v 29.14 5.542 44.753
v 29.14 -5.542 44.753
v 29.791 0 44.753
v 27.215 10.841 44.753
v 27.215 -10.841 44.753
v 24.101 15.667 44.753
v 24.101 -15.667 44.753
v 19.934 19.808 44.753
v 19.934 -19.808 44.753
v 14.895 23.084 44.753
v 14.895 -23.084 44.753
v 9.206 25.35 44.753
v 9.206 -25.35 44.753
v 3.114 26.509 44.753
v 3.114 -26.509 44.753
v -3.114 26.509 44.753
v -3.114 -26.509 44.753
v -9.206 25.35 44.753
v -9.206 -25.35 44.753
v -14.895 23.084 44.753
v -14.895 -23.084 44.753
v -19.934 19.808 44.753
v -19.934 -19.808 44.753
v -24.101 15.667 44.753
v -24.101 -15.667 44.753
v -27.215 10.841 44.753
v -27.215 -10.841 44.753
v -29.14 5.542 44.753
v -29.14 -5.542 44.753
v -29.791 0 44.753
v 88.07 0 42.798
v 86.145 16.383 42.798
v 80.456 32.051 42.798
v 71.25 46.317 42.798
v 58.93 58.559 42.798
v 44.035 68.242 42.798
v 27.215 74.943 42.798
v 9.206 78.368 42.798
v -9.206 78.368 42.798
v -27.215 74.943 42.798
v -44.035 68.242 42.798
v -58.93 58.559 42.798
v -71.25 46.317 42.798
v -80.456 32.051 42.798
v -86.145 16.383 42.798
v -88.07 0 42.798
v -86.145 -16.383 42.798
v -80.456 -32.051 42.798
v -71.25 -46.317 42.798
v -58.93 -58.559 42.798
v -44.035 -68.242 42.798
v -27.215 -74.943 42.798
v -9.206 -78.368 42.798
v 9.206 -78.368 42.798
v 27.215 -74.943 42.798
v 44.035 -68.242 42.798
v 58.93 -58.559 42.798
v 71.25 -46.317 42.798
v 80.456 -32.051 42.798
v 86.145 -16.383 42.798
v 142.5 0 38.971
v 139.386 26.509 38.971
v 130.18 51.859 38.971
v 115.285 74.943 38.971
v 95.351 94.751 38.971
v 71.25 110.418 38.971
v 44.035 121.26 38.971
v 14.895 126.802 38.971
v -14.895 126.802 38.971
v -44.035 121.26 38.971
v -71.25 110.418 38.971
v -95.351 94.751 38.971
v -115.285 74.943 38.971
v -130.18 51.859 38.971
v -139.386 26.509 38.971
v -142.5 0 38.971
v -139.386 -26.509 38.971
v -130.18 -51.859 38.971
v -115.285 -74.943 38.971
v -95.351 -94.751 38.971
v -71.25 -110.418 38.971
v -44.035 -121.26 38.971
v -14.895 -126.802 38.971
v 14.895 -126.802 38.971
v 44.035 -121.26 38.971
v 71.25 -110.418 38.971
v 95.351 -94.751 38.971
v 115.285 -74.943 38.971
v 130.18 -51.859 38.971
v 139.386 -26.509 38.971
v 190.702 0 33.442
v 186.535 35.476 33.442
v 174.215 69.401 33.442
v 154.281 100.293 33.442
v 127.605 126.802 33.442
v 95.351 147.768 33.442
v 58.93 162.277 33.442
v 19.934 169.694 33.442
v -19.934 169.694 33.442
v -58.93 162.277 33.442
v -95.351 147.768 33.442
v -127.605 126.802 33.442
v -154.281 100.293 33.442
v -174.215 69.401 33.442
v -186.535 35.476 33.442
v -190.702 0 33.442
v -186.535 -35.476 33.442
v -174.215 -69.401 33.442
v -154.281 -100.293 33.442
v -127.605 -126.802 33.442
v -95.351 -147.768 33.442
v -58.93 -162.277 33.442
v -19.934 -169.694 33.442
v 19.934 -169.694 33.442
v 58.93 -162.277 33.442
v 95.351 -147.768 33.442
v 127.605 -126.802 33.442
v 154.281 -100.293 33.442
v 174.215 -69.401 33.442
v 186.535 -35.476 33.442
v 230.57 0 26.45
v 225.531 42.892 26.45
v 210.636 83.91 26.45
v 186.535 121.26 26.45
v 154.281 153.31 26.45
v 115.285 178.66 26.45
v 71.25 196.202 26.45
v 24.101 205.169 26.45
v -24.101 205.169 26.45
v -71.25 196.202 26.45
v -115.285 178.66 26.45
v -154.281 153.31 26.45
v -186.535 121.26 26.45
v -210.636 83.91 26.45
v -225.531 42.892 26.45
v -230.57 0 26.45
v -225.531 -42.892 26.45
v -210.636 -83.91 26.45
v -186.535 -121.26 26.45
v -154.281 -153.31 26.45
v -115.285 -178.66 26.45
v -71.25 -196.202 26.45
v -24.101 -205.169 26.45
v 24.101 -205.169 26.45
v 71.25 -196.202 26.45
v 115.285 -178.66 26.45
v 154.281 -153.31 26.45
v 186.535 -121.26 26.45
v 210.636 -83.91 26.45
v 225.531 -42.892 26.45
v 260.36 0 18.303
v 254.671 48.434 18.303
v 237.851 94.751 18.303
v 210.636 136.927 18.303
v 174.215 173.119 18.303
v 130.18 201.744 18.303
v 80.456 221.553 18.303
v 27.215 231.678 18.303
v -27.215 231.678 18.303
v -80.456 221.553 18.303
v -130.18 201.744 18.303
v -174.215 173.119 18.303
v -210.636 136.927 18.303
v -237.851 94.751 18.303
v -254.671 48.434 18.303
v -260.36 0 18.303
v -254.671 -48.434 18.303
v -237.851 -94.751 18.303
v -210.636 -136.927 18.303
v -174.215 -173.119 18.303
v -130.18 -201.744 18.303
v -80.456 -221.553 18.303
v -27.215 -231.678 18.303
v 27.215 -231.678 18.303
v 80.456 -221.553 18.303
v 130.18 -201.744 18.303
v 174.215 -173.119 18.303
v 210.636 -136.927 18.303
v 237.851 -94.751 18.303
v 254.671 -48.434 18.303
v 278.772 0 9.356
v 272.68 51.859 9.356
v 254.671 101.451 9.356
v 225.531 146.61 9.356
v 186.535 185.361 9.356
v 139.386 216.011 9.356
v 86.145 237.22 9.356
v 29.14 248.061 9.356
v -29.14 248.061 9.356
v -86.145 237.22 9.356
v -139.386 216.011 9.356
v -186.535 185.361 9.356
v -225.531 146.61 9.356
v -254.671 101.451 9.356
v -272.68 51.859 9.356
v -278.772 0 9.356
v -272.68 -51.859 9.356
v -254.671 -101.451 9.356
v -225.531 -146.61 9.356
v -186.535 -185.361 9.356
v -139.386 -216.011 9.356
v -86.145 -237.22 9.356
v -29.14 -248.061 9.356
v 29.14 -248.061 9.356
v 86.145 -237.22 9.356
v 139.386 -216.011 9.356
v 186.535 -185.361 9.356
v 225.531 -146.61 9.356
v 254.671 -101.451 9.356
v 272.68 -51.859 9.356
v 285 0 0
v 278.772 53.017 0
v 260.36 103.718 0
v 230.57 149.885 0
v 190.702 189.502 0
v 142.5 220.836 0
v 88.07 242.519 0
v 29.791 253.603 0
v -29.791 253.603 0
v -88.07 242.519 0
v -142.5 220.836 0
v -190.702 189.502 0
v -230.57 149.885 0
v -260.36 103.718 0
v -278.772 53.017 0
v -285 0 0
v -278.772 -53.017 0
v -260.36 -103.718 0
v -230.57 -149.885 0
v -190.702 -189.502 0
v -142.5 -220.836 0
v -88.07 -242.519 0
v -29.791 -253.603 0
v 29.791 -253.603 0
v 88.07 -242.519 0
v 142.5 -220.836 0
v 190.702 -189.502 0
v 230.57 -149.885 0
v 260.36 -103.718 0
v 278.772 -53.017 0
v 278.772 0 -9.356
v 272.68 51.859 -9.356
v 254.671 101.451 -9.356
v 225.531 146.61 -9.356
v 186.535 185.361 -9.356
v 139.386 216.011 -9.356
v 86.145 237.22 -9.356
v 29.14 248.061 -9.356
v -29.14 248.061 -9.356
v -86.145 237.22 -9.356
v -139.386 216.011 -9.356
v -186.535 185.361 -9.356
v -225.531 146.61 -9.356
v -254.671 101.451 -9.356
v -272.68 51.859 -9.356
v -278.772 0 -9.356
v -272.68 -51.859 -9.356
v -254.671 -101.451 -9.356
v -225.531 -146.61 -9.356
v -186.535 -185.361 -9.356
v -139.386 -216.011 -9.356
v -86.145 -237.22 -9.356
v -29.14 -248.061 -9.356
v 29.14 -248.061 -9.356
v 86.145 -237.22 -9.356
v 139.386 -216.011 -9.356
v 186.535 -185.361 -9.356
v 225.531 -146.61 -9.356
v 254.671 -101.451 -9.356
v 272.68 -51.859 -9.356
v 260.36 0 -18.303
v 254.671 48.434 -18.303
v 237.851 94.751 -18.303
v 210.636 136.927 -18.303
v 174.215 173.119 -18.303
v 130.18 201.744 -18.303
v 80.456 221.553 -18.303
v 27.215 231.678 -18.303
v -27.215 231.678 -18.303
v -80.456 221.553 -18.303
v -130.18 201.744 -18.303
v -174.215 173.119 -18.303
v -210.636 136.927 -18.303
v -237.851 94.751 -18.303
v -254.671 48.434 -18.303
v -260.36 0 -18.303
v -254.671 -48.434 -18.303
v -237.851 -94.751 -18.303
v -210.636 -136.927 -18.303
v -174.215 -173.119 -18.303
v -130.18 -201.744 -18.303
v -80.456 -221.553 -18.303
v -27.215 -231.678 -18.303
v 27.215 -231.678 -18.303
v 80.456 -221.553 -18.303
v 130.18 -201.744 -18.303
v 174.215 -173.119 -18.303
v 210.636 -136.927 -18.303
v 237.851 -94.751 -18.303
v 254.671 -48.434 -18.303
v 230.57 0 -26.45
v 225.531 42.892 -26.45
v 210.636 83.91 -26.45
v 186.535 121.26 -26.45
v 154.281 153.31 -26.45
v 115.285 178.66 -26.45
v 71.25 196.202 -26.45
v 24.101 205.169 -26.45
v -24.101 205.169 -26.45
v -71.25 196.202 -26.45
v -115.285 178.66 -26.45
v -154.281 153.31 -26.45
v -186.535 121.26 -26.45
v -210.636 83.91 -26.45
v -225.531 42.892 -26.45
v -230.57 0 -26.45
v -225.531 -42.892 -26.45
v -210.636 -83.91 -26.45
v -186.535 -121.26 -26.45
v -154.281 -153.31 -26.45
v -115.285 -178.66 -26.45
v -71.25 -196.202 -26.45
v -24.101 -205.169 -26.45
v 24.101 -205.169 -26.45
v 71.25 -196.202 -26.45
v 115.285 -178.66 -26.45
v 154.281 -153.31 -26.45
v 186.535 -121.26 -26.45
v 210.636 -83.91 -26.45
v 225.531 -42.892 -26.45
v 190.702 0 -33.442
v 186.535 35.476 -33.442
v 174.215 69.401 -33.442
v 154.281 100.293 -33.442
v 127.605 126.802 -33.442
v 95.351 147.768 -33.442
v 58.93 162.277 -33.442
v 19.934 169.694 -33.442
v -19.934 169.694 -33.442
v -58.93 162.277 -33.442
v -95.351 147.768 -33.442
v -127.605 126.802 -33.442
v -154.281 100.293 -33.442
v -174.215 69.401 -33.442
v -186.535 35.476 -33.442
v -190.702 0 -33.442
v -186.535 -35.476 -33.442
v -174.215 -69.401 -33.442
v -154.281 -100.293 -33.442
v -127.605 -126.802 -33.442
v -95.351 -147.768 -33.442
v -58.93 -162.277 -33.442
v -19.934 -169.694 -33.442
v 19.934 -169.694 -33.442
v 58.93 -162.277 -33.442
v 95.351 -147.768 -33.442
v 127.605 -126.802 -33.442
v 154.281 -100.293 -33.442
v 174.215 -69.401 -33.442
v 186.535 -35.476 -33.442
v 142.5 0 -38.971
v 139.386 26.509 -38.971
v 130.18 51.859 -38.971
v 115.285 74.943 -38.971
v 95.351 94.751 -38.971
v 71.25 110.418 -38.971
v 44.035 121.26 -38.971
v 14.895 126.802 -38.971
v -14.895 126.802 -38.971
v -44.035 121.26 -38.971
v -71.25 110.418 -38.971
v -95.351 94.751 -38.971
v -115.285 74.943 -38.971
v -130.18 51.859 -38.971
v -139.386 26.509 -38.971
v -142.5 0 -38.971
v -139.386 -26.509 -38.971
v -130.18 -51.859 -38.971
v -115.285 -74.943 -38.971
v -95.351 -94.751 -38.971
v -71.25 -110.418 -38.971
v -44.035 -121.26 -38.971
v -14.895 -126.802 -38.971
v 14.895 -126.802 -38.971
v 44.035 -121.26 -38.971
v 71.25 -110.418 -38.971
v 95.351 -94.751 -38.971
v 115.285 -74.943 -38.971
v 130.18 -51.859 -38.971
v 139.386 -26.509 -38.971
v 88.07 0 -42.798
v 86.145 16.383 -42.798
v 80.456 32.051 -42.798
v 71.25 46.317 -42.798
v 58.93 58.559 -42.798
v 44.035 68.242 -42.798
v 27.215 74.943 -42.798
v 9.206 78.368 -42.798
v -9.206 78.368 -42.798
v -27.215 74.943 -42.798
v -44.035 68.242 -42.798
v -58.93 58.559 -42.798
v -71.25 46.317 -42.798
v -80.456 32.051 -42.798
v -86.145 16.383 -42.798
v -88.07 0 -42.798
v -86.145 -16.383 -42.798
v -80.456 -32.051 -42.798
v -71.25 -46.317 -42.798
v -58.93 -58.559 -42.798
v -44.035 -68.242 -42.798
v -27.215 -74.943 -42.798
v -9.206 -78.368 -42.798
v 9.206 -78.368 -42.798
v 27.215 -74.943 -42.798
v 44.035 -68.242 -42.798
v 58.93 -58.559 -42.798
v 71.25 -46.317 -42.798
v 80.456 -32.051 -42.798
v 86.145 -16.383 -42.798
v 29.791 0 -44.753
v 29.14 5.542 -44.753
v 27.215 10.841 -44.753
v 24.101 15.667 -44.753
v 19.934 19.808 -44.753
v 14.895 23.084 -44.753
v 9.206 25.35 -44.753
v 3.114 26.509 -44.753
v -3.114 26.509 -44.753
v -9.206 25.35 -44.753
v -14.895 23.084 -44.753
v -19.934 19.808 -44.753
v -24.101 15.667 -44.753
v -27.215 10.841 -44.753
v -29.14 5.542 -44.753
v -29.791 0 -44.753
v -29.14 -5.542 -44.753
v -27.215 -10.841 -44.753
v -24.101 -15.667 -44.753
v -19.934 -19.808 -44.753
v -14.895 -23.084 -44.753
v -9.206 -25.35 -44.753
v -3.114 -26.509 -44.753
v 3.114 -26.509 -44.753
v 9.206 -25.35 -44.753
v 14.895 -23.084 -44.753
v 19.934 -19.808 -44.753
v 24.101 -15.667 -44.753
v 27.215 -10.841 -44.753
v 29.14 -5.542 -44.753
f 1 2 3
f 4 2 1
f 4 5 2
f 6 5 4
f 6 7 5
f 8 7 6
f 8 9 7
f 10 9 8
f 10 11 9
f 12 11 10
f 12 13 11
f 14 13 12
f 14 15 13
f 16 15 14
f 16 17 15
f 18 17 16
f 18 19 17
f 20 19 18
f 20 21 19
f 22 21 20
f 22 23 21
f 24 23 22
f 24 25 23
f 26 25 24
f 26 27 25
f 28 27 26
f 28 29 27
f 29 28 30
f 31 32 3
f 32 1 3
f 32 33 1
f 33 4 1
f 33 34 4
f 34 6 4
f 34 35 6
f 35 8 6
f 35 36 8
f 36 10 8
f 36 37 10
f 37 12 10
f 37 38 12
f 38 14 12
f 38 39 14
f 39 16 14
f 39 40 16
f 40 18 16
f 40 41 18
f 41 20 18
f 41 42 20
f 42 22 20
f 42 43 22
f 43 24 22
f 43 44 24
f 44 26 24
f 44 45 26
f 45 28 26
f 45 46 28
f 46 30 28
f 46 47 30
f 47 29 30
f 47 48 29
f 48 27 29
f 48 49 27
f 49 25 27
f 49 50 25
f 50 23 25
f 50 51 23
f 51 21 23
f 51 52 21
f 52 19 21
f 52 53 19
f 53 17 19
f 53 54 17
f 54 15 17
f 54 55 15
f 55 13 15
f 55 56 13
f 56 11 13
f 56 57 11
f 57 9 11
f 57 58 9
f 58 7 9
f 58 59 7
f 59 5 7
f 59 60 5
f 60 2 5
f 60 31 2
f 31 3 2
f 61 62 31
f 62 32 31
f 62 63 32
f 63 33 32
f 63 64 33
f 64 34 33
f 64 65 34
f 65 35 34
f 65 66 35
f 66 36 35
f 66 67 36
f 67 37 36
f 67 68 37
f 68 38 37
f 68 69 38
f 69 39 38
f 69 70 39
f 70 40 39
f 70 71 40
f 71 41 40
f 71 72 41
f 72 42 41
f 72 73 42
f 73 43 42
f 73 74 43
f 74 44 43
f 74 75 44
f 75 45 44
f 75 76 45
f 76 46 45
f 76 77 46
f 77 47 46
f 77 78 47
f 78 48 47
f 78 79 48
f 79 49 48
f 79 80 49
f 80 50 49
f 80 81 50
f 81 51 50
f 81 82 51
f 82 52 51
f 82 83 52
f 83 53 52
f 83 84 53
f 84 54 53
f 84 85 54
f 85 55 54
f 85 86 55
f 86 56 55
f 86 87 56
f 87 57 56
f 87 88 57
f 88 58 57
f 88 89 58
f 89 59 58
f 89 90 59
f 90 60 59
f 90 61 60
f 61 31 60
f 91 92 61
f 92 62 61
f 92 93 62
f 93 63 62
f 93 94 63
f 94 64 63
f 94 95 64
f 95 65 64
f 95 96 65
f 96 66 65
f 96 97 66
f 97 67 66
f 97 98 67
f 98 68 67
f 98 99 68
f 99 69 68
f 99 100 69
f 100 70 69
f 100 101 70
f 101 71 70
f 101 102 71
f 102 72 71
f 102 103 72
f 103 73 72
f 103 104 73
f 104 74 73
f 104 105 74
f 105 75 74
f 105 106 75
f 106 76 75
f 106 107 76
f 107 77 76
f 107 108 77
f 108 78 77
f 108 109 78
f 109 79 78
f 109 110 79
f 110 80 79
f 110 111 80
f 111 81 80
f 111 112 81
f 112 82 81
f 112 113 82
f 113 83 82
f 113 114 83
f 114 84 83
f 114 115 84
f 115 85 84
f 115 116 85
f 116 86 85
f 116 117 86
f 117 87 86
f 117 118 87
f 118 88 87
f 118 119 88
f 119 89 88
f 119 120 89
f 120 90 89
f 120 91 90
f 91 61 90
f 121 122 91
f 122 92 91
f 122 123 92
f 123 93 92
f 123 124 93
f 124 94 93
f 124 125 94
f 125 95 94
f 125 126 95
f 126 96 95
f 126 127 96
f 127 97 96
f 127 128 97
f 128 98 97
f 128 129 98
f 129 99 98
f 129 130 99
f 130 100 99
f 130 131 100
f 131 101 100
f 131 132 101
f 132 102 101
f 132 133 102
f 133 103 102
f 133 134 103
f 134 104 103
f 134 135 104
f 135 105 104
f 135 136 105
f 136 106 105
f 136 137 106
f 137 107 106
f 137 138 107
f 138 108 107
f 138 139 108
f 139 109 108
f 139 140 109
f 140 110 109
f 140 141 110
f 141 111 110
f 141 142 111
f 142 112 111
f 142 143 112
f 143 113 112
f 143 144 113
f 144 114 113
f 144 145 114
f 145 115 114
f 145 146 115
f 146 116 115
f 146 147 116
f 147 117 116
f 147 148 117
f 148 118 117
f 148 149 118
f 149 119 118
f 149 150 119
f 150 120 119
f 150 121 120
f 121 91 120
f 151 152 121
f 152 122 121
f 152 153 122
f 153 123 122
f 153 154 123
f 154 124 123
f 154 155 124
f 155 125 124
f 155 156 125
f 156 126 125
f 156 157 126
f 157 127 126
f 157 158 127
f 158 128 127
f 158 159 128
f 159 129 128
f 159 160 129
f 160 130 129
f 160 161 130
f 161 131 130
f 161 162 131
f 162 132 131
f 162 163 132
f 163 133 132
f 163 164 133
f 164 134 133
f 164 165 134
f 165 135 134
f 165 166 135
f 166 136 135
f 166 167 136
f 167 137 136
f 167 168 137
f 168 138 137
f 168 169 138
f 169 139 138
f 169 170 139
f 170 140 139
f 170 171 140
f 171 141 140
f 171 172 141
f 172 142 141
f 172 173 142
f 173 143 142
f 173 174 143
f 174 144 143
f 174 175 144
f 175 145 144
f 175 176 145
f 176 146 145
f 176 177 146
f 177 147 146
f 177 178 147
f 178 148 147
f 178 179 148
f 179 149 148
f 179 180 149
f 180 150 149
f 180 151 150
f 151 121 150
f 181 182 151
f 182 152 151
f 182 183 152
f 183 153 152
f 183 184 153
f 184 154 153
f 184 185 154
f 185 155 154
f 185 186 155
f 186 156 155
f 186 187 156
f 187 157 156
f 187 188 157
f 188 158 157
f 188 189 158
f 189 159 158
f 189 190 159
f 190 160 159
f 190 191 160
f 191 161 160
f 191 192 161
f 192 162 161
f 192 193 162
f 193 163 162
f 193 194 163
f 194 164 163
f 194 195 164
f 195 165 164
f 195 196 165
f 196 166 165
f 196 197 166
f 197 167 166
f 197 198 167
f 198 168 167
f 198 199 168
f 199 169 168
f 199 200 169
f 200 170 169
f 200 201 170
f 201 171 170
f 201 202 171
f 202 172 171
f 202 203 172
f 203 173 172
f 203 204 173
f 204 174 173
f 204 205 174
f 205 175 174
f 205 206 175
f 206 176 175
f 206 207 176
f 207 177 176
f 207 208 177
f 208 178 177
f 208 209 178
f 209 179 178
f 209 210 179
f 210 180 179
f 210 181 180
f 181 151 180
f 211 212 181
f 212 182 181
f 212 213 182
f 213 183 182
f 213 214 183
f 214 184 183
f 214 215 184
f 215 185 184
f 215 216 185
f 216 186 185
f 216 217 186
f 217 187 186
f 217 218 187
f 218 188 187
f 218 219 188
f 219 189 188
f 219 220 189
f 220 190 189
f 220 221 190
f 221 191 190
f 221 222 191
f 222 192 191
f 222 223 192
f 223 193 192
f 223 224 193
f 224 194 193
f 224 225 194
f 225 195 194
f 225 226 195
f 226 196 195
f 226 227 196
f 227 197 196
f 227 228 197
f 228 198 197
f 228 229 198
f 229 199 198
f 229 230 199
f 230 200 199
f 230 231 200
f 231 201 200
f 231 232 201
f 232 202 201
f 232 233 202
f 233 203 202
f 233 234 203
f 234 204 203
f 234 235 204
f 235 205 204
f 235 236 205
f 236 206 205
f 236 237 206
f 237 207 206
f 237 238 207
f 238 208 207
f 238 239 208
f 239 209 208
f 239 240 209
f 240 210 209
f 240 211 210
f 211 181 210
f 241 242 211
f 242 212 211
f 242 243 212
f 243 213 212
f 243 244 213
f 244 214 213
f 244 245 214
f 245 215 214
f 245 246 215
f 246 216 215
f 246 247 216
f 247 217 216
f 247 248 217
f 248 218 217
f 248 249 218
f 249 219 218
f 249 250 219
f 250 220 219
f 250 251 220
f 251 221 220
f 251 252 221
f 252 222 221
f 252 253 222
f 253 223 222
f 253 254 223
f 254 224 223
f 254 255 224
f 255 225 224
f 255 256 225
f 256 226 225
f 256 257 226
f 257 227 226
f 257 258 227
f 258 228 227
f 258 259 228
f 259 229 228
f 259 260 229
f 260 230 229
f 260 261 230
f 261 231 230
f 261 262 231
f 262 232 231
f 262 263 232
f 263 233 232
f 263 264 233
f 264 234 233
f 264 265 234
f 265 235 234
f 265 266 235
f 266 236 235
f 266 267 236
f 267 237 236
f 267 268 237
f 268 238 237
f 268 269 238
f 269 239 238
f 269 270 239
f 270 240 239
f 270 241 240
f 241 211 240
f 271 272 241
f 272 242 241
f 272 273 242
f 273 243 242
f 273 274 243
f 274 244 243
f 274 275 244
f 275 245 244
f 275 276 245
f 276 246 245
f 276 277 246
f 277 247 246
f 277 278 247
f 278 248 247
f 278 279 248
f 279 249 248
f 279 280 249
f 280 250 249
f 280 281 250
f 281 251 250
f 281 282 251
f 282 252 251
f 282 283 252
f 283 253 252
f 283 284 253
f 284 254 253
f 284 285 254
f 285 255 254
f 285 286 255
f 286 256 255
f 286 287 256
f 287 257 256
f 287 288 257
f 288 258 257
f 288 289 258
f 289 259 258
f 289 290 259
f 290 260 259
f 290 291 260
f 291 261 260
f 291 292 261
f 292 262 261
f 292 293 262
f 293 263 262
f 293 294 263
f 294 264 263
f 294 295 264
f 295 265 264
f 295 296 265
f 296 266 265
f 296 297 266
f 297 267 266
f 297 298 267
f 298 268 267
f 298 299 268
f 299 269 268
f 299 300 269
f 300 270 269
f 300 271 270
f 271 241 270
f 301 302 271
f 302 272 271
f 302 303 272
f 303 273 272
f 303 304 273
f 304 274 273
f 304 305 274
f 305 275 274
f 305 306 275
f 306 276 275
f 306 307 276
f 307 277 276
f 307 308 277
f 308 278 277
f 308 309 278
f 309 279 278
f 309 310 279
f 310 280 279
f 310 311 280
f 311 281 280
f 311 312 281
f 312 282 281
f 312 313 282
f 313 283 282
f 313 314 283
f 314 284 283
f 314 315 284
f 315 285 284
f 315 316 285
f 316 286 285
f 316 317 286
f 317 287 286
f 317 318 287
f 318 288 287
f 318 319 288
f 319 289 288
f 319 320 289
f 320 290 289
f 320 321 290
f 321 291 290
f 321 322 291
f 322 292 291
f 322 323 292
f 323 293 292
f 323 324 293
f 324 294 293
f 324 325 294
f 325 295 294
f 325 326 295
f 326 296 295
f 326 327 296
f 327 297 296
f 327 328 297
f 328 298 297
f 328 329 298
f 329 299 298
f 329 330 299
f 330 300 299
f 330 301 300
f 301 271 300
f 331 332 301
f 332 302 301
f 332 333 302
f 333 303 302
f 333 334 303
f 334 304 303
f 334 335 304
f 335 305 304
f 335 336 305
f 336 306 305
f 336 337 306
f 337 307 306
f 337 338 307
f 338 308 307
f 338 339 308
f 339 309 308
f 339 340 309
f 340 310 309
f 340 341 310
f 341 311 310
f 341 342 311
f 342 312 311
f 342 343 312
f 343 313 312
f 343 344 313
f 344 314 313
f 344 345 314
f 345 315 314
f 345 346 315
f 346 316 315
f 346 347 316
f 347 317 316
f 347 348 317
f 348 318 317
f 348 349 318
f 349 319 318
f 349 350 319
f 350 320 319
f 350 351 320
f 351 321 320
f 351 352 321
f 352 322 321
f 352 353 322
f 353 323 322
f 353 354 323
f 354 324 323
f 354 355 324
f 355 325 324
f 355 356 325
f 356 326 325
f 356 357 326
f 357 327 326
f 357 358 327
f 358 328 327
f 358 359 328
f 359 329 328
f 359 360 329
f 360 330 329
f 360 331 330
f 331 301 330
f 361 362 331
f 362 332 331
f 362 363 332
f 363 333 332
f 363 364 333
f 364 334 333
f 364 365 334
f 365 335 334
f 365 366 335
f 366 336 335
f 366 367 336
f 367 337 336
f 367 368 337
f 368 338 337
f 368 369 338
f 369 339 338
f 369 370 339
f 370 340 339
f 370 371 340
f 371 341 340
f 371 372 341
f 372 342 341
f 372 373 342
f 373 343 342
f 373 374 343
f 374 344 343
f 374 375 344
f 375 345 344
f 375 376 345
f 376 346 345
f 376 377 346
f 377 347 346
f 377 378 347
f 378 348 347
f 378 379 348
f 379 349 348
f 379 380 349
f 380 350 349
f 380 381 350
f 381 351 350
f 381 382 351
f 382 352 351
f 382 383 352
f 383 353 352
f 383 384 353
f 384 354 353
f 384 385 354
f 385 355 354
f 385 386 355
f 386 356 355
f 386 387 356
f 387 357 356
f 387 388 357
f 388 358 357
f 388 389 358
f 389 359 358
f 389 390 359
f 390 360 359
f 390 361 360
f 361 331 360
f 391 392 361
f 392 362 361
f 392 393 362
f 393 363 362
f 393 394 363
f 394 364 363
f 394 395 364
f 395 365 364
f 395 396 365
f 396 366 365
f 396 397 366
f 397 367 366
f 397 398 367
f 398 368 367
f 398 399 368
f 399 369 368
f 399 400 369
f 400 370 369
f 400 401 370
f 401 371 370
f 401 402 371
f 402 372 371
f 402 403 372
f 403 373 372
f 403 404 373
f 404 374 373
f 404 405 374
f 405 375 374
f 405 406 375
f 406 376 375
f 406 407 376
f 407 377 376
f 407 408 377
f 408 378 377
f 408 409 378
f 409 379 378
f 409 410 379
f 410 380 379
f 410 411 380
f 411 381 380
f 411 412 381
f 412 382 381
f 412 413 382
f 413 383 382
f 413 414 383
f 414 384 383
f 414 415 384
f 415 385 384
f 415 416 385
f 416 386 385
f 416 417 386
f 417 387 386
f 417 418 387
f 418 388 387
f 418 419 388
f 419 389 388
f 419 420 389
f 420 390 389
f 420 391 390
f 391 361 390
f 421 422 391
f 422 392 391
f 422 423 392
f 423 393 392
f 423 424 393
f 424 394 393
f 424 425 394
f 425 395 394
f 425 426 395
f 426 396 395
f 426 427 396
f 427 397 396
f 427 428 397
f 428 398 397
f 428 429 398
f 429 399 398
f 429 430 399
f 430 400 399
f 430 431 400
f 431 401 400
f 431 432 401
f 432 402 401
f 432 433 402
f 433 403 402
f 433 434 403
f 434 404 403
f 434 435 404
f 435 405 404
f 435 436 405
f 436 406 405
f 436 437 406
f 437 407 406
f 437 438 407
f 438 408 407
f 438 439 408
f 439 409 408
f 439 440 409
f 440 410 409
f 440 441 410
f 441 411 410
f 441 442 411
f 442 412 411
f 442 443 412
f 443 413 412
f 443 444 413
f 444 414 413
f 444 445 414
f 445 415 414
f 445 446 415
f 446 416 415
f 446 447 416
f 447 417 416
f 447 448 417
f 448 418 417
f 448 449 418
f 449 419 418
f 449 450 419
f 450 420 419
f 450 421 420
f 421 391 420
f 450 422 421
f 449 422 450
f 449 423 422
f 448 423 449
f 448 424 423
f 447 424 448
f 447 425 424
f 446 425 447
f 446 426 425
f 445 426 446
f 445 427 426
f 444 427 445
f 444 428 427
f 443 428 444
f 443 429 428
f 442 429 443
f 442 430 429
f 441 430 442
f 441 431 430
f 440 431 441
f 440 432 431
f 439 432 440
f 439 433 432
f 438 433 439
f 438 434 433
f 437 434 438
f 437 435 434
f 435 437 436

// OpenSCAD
// Generated by SolidPython 1.0.1 on 2020-07-29 00:46:54


scale(v = [19, 17, 3]) {
	sphere(r = 15);
}
/***********************************************
*********      SolidPython code:      **********
************************************************
 
# import packages: SolidPython
from solid import *
from solid.utils import *
from itertools import chain, combinations, permutations


class Resize:

    def __init__(self, scad_file):
        self.scad_file = scad_file
        #self.scad_file = import_scad(scad_file)
        # cone/cylinder param:
        self.r1 = 0
        self.r2 = 0
        self.h = 0
        # rectangular prism param:
        self.w = 0
        self.l = 0
        # ellipse param:
        self.r = 0

    # import OpenScad code (file name corresponds to shape)


    # classify shape + parameters
    def assign(self, param1, param2, param3):
        if self.scad_file == 'cone.scad':
            self.r1 = param1
            self.r2 = param2
            self.h = param3
        elif self.scad_file == 'cylinder.scad':
            self.r1 = param1
            self.r2 = param2
            self.h = param3
        elif self.scad_file == 'rectangularPrism.scad':
            self.h = param1
            self.l = param2
            self.w = param3
        else:
            self.r = param1
            self.h = param2

    # resize parameters
    def iterate(self):
        x = range(3, 20, 2)
        i = 1
        if self.scad_file == 'cone.scad':
            tempList = list(permutations(x, 2))
            for temp in tempList:
                param1 = temp[0]
                param2 = temp[1]
                filepath = 'produced_scad_files/' + 'cone' + str(param1) + '_' + str(param2) + '_' + '.scad'
                scad_render_to_file(cylinder(h=param1, r1=param2, r2=0), filepath)

        elif self.scad_file == 'cylinder.scad':
            tempList = list(permutations(x, 3))
            for temp in tempList:
                param1 = temp[0]
                param2 = temp[1]
                filepath = 'produced_scad_files/' + 'cylinder' + str(param1) + '_' + str(param2) + '_' + '.scad'
                scad_render_to_file(cylinder(h=param1, r1=param2, r2=param2), filepath)

        elif self.scad_file == 'rectangularPrism.scad':
            tempList = list(permutations(x, 3))
            for temp in tempList:
                param1 = temp[0]
                param2 = temp[1]
                param3 = temp[2]
                filepath = 'produced_scad_files/' + 'rectangularPrism' + str(param1) + '_' + str(param2) + '_' + str(
                    param3) + '.scad'
                scad_render_to_file(cube(size=(param1, param2, param3)), filepath)

        elif self.scad_file == 'ellipse.scad':
            tempList = list(permutations(x, 4))
            for temp in tempList:
                param1 = temp[0]
                param2 = temp[1]
                param3 = temp[2]
                param4 = temp[3]
                filepath = 'produced_scad_files/' + 'ellipse' + str(param1) + '_' + str(param2) + '_' + str(param3) + '_' + str(param4) + '.scad'
                scad_render_to_file(scale([param1, param2, param3])(sphere(r=param4)), filepath)

    def render_to_scadfile(self):
        scad_render_to_file(scad, 'example.scad') 
 
************************************************/
